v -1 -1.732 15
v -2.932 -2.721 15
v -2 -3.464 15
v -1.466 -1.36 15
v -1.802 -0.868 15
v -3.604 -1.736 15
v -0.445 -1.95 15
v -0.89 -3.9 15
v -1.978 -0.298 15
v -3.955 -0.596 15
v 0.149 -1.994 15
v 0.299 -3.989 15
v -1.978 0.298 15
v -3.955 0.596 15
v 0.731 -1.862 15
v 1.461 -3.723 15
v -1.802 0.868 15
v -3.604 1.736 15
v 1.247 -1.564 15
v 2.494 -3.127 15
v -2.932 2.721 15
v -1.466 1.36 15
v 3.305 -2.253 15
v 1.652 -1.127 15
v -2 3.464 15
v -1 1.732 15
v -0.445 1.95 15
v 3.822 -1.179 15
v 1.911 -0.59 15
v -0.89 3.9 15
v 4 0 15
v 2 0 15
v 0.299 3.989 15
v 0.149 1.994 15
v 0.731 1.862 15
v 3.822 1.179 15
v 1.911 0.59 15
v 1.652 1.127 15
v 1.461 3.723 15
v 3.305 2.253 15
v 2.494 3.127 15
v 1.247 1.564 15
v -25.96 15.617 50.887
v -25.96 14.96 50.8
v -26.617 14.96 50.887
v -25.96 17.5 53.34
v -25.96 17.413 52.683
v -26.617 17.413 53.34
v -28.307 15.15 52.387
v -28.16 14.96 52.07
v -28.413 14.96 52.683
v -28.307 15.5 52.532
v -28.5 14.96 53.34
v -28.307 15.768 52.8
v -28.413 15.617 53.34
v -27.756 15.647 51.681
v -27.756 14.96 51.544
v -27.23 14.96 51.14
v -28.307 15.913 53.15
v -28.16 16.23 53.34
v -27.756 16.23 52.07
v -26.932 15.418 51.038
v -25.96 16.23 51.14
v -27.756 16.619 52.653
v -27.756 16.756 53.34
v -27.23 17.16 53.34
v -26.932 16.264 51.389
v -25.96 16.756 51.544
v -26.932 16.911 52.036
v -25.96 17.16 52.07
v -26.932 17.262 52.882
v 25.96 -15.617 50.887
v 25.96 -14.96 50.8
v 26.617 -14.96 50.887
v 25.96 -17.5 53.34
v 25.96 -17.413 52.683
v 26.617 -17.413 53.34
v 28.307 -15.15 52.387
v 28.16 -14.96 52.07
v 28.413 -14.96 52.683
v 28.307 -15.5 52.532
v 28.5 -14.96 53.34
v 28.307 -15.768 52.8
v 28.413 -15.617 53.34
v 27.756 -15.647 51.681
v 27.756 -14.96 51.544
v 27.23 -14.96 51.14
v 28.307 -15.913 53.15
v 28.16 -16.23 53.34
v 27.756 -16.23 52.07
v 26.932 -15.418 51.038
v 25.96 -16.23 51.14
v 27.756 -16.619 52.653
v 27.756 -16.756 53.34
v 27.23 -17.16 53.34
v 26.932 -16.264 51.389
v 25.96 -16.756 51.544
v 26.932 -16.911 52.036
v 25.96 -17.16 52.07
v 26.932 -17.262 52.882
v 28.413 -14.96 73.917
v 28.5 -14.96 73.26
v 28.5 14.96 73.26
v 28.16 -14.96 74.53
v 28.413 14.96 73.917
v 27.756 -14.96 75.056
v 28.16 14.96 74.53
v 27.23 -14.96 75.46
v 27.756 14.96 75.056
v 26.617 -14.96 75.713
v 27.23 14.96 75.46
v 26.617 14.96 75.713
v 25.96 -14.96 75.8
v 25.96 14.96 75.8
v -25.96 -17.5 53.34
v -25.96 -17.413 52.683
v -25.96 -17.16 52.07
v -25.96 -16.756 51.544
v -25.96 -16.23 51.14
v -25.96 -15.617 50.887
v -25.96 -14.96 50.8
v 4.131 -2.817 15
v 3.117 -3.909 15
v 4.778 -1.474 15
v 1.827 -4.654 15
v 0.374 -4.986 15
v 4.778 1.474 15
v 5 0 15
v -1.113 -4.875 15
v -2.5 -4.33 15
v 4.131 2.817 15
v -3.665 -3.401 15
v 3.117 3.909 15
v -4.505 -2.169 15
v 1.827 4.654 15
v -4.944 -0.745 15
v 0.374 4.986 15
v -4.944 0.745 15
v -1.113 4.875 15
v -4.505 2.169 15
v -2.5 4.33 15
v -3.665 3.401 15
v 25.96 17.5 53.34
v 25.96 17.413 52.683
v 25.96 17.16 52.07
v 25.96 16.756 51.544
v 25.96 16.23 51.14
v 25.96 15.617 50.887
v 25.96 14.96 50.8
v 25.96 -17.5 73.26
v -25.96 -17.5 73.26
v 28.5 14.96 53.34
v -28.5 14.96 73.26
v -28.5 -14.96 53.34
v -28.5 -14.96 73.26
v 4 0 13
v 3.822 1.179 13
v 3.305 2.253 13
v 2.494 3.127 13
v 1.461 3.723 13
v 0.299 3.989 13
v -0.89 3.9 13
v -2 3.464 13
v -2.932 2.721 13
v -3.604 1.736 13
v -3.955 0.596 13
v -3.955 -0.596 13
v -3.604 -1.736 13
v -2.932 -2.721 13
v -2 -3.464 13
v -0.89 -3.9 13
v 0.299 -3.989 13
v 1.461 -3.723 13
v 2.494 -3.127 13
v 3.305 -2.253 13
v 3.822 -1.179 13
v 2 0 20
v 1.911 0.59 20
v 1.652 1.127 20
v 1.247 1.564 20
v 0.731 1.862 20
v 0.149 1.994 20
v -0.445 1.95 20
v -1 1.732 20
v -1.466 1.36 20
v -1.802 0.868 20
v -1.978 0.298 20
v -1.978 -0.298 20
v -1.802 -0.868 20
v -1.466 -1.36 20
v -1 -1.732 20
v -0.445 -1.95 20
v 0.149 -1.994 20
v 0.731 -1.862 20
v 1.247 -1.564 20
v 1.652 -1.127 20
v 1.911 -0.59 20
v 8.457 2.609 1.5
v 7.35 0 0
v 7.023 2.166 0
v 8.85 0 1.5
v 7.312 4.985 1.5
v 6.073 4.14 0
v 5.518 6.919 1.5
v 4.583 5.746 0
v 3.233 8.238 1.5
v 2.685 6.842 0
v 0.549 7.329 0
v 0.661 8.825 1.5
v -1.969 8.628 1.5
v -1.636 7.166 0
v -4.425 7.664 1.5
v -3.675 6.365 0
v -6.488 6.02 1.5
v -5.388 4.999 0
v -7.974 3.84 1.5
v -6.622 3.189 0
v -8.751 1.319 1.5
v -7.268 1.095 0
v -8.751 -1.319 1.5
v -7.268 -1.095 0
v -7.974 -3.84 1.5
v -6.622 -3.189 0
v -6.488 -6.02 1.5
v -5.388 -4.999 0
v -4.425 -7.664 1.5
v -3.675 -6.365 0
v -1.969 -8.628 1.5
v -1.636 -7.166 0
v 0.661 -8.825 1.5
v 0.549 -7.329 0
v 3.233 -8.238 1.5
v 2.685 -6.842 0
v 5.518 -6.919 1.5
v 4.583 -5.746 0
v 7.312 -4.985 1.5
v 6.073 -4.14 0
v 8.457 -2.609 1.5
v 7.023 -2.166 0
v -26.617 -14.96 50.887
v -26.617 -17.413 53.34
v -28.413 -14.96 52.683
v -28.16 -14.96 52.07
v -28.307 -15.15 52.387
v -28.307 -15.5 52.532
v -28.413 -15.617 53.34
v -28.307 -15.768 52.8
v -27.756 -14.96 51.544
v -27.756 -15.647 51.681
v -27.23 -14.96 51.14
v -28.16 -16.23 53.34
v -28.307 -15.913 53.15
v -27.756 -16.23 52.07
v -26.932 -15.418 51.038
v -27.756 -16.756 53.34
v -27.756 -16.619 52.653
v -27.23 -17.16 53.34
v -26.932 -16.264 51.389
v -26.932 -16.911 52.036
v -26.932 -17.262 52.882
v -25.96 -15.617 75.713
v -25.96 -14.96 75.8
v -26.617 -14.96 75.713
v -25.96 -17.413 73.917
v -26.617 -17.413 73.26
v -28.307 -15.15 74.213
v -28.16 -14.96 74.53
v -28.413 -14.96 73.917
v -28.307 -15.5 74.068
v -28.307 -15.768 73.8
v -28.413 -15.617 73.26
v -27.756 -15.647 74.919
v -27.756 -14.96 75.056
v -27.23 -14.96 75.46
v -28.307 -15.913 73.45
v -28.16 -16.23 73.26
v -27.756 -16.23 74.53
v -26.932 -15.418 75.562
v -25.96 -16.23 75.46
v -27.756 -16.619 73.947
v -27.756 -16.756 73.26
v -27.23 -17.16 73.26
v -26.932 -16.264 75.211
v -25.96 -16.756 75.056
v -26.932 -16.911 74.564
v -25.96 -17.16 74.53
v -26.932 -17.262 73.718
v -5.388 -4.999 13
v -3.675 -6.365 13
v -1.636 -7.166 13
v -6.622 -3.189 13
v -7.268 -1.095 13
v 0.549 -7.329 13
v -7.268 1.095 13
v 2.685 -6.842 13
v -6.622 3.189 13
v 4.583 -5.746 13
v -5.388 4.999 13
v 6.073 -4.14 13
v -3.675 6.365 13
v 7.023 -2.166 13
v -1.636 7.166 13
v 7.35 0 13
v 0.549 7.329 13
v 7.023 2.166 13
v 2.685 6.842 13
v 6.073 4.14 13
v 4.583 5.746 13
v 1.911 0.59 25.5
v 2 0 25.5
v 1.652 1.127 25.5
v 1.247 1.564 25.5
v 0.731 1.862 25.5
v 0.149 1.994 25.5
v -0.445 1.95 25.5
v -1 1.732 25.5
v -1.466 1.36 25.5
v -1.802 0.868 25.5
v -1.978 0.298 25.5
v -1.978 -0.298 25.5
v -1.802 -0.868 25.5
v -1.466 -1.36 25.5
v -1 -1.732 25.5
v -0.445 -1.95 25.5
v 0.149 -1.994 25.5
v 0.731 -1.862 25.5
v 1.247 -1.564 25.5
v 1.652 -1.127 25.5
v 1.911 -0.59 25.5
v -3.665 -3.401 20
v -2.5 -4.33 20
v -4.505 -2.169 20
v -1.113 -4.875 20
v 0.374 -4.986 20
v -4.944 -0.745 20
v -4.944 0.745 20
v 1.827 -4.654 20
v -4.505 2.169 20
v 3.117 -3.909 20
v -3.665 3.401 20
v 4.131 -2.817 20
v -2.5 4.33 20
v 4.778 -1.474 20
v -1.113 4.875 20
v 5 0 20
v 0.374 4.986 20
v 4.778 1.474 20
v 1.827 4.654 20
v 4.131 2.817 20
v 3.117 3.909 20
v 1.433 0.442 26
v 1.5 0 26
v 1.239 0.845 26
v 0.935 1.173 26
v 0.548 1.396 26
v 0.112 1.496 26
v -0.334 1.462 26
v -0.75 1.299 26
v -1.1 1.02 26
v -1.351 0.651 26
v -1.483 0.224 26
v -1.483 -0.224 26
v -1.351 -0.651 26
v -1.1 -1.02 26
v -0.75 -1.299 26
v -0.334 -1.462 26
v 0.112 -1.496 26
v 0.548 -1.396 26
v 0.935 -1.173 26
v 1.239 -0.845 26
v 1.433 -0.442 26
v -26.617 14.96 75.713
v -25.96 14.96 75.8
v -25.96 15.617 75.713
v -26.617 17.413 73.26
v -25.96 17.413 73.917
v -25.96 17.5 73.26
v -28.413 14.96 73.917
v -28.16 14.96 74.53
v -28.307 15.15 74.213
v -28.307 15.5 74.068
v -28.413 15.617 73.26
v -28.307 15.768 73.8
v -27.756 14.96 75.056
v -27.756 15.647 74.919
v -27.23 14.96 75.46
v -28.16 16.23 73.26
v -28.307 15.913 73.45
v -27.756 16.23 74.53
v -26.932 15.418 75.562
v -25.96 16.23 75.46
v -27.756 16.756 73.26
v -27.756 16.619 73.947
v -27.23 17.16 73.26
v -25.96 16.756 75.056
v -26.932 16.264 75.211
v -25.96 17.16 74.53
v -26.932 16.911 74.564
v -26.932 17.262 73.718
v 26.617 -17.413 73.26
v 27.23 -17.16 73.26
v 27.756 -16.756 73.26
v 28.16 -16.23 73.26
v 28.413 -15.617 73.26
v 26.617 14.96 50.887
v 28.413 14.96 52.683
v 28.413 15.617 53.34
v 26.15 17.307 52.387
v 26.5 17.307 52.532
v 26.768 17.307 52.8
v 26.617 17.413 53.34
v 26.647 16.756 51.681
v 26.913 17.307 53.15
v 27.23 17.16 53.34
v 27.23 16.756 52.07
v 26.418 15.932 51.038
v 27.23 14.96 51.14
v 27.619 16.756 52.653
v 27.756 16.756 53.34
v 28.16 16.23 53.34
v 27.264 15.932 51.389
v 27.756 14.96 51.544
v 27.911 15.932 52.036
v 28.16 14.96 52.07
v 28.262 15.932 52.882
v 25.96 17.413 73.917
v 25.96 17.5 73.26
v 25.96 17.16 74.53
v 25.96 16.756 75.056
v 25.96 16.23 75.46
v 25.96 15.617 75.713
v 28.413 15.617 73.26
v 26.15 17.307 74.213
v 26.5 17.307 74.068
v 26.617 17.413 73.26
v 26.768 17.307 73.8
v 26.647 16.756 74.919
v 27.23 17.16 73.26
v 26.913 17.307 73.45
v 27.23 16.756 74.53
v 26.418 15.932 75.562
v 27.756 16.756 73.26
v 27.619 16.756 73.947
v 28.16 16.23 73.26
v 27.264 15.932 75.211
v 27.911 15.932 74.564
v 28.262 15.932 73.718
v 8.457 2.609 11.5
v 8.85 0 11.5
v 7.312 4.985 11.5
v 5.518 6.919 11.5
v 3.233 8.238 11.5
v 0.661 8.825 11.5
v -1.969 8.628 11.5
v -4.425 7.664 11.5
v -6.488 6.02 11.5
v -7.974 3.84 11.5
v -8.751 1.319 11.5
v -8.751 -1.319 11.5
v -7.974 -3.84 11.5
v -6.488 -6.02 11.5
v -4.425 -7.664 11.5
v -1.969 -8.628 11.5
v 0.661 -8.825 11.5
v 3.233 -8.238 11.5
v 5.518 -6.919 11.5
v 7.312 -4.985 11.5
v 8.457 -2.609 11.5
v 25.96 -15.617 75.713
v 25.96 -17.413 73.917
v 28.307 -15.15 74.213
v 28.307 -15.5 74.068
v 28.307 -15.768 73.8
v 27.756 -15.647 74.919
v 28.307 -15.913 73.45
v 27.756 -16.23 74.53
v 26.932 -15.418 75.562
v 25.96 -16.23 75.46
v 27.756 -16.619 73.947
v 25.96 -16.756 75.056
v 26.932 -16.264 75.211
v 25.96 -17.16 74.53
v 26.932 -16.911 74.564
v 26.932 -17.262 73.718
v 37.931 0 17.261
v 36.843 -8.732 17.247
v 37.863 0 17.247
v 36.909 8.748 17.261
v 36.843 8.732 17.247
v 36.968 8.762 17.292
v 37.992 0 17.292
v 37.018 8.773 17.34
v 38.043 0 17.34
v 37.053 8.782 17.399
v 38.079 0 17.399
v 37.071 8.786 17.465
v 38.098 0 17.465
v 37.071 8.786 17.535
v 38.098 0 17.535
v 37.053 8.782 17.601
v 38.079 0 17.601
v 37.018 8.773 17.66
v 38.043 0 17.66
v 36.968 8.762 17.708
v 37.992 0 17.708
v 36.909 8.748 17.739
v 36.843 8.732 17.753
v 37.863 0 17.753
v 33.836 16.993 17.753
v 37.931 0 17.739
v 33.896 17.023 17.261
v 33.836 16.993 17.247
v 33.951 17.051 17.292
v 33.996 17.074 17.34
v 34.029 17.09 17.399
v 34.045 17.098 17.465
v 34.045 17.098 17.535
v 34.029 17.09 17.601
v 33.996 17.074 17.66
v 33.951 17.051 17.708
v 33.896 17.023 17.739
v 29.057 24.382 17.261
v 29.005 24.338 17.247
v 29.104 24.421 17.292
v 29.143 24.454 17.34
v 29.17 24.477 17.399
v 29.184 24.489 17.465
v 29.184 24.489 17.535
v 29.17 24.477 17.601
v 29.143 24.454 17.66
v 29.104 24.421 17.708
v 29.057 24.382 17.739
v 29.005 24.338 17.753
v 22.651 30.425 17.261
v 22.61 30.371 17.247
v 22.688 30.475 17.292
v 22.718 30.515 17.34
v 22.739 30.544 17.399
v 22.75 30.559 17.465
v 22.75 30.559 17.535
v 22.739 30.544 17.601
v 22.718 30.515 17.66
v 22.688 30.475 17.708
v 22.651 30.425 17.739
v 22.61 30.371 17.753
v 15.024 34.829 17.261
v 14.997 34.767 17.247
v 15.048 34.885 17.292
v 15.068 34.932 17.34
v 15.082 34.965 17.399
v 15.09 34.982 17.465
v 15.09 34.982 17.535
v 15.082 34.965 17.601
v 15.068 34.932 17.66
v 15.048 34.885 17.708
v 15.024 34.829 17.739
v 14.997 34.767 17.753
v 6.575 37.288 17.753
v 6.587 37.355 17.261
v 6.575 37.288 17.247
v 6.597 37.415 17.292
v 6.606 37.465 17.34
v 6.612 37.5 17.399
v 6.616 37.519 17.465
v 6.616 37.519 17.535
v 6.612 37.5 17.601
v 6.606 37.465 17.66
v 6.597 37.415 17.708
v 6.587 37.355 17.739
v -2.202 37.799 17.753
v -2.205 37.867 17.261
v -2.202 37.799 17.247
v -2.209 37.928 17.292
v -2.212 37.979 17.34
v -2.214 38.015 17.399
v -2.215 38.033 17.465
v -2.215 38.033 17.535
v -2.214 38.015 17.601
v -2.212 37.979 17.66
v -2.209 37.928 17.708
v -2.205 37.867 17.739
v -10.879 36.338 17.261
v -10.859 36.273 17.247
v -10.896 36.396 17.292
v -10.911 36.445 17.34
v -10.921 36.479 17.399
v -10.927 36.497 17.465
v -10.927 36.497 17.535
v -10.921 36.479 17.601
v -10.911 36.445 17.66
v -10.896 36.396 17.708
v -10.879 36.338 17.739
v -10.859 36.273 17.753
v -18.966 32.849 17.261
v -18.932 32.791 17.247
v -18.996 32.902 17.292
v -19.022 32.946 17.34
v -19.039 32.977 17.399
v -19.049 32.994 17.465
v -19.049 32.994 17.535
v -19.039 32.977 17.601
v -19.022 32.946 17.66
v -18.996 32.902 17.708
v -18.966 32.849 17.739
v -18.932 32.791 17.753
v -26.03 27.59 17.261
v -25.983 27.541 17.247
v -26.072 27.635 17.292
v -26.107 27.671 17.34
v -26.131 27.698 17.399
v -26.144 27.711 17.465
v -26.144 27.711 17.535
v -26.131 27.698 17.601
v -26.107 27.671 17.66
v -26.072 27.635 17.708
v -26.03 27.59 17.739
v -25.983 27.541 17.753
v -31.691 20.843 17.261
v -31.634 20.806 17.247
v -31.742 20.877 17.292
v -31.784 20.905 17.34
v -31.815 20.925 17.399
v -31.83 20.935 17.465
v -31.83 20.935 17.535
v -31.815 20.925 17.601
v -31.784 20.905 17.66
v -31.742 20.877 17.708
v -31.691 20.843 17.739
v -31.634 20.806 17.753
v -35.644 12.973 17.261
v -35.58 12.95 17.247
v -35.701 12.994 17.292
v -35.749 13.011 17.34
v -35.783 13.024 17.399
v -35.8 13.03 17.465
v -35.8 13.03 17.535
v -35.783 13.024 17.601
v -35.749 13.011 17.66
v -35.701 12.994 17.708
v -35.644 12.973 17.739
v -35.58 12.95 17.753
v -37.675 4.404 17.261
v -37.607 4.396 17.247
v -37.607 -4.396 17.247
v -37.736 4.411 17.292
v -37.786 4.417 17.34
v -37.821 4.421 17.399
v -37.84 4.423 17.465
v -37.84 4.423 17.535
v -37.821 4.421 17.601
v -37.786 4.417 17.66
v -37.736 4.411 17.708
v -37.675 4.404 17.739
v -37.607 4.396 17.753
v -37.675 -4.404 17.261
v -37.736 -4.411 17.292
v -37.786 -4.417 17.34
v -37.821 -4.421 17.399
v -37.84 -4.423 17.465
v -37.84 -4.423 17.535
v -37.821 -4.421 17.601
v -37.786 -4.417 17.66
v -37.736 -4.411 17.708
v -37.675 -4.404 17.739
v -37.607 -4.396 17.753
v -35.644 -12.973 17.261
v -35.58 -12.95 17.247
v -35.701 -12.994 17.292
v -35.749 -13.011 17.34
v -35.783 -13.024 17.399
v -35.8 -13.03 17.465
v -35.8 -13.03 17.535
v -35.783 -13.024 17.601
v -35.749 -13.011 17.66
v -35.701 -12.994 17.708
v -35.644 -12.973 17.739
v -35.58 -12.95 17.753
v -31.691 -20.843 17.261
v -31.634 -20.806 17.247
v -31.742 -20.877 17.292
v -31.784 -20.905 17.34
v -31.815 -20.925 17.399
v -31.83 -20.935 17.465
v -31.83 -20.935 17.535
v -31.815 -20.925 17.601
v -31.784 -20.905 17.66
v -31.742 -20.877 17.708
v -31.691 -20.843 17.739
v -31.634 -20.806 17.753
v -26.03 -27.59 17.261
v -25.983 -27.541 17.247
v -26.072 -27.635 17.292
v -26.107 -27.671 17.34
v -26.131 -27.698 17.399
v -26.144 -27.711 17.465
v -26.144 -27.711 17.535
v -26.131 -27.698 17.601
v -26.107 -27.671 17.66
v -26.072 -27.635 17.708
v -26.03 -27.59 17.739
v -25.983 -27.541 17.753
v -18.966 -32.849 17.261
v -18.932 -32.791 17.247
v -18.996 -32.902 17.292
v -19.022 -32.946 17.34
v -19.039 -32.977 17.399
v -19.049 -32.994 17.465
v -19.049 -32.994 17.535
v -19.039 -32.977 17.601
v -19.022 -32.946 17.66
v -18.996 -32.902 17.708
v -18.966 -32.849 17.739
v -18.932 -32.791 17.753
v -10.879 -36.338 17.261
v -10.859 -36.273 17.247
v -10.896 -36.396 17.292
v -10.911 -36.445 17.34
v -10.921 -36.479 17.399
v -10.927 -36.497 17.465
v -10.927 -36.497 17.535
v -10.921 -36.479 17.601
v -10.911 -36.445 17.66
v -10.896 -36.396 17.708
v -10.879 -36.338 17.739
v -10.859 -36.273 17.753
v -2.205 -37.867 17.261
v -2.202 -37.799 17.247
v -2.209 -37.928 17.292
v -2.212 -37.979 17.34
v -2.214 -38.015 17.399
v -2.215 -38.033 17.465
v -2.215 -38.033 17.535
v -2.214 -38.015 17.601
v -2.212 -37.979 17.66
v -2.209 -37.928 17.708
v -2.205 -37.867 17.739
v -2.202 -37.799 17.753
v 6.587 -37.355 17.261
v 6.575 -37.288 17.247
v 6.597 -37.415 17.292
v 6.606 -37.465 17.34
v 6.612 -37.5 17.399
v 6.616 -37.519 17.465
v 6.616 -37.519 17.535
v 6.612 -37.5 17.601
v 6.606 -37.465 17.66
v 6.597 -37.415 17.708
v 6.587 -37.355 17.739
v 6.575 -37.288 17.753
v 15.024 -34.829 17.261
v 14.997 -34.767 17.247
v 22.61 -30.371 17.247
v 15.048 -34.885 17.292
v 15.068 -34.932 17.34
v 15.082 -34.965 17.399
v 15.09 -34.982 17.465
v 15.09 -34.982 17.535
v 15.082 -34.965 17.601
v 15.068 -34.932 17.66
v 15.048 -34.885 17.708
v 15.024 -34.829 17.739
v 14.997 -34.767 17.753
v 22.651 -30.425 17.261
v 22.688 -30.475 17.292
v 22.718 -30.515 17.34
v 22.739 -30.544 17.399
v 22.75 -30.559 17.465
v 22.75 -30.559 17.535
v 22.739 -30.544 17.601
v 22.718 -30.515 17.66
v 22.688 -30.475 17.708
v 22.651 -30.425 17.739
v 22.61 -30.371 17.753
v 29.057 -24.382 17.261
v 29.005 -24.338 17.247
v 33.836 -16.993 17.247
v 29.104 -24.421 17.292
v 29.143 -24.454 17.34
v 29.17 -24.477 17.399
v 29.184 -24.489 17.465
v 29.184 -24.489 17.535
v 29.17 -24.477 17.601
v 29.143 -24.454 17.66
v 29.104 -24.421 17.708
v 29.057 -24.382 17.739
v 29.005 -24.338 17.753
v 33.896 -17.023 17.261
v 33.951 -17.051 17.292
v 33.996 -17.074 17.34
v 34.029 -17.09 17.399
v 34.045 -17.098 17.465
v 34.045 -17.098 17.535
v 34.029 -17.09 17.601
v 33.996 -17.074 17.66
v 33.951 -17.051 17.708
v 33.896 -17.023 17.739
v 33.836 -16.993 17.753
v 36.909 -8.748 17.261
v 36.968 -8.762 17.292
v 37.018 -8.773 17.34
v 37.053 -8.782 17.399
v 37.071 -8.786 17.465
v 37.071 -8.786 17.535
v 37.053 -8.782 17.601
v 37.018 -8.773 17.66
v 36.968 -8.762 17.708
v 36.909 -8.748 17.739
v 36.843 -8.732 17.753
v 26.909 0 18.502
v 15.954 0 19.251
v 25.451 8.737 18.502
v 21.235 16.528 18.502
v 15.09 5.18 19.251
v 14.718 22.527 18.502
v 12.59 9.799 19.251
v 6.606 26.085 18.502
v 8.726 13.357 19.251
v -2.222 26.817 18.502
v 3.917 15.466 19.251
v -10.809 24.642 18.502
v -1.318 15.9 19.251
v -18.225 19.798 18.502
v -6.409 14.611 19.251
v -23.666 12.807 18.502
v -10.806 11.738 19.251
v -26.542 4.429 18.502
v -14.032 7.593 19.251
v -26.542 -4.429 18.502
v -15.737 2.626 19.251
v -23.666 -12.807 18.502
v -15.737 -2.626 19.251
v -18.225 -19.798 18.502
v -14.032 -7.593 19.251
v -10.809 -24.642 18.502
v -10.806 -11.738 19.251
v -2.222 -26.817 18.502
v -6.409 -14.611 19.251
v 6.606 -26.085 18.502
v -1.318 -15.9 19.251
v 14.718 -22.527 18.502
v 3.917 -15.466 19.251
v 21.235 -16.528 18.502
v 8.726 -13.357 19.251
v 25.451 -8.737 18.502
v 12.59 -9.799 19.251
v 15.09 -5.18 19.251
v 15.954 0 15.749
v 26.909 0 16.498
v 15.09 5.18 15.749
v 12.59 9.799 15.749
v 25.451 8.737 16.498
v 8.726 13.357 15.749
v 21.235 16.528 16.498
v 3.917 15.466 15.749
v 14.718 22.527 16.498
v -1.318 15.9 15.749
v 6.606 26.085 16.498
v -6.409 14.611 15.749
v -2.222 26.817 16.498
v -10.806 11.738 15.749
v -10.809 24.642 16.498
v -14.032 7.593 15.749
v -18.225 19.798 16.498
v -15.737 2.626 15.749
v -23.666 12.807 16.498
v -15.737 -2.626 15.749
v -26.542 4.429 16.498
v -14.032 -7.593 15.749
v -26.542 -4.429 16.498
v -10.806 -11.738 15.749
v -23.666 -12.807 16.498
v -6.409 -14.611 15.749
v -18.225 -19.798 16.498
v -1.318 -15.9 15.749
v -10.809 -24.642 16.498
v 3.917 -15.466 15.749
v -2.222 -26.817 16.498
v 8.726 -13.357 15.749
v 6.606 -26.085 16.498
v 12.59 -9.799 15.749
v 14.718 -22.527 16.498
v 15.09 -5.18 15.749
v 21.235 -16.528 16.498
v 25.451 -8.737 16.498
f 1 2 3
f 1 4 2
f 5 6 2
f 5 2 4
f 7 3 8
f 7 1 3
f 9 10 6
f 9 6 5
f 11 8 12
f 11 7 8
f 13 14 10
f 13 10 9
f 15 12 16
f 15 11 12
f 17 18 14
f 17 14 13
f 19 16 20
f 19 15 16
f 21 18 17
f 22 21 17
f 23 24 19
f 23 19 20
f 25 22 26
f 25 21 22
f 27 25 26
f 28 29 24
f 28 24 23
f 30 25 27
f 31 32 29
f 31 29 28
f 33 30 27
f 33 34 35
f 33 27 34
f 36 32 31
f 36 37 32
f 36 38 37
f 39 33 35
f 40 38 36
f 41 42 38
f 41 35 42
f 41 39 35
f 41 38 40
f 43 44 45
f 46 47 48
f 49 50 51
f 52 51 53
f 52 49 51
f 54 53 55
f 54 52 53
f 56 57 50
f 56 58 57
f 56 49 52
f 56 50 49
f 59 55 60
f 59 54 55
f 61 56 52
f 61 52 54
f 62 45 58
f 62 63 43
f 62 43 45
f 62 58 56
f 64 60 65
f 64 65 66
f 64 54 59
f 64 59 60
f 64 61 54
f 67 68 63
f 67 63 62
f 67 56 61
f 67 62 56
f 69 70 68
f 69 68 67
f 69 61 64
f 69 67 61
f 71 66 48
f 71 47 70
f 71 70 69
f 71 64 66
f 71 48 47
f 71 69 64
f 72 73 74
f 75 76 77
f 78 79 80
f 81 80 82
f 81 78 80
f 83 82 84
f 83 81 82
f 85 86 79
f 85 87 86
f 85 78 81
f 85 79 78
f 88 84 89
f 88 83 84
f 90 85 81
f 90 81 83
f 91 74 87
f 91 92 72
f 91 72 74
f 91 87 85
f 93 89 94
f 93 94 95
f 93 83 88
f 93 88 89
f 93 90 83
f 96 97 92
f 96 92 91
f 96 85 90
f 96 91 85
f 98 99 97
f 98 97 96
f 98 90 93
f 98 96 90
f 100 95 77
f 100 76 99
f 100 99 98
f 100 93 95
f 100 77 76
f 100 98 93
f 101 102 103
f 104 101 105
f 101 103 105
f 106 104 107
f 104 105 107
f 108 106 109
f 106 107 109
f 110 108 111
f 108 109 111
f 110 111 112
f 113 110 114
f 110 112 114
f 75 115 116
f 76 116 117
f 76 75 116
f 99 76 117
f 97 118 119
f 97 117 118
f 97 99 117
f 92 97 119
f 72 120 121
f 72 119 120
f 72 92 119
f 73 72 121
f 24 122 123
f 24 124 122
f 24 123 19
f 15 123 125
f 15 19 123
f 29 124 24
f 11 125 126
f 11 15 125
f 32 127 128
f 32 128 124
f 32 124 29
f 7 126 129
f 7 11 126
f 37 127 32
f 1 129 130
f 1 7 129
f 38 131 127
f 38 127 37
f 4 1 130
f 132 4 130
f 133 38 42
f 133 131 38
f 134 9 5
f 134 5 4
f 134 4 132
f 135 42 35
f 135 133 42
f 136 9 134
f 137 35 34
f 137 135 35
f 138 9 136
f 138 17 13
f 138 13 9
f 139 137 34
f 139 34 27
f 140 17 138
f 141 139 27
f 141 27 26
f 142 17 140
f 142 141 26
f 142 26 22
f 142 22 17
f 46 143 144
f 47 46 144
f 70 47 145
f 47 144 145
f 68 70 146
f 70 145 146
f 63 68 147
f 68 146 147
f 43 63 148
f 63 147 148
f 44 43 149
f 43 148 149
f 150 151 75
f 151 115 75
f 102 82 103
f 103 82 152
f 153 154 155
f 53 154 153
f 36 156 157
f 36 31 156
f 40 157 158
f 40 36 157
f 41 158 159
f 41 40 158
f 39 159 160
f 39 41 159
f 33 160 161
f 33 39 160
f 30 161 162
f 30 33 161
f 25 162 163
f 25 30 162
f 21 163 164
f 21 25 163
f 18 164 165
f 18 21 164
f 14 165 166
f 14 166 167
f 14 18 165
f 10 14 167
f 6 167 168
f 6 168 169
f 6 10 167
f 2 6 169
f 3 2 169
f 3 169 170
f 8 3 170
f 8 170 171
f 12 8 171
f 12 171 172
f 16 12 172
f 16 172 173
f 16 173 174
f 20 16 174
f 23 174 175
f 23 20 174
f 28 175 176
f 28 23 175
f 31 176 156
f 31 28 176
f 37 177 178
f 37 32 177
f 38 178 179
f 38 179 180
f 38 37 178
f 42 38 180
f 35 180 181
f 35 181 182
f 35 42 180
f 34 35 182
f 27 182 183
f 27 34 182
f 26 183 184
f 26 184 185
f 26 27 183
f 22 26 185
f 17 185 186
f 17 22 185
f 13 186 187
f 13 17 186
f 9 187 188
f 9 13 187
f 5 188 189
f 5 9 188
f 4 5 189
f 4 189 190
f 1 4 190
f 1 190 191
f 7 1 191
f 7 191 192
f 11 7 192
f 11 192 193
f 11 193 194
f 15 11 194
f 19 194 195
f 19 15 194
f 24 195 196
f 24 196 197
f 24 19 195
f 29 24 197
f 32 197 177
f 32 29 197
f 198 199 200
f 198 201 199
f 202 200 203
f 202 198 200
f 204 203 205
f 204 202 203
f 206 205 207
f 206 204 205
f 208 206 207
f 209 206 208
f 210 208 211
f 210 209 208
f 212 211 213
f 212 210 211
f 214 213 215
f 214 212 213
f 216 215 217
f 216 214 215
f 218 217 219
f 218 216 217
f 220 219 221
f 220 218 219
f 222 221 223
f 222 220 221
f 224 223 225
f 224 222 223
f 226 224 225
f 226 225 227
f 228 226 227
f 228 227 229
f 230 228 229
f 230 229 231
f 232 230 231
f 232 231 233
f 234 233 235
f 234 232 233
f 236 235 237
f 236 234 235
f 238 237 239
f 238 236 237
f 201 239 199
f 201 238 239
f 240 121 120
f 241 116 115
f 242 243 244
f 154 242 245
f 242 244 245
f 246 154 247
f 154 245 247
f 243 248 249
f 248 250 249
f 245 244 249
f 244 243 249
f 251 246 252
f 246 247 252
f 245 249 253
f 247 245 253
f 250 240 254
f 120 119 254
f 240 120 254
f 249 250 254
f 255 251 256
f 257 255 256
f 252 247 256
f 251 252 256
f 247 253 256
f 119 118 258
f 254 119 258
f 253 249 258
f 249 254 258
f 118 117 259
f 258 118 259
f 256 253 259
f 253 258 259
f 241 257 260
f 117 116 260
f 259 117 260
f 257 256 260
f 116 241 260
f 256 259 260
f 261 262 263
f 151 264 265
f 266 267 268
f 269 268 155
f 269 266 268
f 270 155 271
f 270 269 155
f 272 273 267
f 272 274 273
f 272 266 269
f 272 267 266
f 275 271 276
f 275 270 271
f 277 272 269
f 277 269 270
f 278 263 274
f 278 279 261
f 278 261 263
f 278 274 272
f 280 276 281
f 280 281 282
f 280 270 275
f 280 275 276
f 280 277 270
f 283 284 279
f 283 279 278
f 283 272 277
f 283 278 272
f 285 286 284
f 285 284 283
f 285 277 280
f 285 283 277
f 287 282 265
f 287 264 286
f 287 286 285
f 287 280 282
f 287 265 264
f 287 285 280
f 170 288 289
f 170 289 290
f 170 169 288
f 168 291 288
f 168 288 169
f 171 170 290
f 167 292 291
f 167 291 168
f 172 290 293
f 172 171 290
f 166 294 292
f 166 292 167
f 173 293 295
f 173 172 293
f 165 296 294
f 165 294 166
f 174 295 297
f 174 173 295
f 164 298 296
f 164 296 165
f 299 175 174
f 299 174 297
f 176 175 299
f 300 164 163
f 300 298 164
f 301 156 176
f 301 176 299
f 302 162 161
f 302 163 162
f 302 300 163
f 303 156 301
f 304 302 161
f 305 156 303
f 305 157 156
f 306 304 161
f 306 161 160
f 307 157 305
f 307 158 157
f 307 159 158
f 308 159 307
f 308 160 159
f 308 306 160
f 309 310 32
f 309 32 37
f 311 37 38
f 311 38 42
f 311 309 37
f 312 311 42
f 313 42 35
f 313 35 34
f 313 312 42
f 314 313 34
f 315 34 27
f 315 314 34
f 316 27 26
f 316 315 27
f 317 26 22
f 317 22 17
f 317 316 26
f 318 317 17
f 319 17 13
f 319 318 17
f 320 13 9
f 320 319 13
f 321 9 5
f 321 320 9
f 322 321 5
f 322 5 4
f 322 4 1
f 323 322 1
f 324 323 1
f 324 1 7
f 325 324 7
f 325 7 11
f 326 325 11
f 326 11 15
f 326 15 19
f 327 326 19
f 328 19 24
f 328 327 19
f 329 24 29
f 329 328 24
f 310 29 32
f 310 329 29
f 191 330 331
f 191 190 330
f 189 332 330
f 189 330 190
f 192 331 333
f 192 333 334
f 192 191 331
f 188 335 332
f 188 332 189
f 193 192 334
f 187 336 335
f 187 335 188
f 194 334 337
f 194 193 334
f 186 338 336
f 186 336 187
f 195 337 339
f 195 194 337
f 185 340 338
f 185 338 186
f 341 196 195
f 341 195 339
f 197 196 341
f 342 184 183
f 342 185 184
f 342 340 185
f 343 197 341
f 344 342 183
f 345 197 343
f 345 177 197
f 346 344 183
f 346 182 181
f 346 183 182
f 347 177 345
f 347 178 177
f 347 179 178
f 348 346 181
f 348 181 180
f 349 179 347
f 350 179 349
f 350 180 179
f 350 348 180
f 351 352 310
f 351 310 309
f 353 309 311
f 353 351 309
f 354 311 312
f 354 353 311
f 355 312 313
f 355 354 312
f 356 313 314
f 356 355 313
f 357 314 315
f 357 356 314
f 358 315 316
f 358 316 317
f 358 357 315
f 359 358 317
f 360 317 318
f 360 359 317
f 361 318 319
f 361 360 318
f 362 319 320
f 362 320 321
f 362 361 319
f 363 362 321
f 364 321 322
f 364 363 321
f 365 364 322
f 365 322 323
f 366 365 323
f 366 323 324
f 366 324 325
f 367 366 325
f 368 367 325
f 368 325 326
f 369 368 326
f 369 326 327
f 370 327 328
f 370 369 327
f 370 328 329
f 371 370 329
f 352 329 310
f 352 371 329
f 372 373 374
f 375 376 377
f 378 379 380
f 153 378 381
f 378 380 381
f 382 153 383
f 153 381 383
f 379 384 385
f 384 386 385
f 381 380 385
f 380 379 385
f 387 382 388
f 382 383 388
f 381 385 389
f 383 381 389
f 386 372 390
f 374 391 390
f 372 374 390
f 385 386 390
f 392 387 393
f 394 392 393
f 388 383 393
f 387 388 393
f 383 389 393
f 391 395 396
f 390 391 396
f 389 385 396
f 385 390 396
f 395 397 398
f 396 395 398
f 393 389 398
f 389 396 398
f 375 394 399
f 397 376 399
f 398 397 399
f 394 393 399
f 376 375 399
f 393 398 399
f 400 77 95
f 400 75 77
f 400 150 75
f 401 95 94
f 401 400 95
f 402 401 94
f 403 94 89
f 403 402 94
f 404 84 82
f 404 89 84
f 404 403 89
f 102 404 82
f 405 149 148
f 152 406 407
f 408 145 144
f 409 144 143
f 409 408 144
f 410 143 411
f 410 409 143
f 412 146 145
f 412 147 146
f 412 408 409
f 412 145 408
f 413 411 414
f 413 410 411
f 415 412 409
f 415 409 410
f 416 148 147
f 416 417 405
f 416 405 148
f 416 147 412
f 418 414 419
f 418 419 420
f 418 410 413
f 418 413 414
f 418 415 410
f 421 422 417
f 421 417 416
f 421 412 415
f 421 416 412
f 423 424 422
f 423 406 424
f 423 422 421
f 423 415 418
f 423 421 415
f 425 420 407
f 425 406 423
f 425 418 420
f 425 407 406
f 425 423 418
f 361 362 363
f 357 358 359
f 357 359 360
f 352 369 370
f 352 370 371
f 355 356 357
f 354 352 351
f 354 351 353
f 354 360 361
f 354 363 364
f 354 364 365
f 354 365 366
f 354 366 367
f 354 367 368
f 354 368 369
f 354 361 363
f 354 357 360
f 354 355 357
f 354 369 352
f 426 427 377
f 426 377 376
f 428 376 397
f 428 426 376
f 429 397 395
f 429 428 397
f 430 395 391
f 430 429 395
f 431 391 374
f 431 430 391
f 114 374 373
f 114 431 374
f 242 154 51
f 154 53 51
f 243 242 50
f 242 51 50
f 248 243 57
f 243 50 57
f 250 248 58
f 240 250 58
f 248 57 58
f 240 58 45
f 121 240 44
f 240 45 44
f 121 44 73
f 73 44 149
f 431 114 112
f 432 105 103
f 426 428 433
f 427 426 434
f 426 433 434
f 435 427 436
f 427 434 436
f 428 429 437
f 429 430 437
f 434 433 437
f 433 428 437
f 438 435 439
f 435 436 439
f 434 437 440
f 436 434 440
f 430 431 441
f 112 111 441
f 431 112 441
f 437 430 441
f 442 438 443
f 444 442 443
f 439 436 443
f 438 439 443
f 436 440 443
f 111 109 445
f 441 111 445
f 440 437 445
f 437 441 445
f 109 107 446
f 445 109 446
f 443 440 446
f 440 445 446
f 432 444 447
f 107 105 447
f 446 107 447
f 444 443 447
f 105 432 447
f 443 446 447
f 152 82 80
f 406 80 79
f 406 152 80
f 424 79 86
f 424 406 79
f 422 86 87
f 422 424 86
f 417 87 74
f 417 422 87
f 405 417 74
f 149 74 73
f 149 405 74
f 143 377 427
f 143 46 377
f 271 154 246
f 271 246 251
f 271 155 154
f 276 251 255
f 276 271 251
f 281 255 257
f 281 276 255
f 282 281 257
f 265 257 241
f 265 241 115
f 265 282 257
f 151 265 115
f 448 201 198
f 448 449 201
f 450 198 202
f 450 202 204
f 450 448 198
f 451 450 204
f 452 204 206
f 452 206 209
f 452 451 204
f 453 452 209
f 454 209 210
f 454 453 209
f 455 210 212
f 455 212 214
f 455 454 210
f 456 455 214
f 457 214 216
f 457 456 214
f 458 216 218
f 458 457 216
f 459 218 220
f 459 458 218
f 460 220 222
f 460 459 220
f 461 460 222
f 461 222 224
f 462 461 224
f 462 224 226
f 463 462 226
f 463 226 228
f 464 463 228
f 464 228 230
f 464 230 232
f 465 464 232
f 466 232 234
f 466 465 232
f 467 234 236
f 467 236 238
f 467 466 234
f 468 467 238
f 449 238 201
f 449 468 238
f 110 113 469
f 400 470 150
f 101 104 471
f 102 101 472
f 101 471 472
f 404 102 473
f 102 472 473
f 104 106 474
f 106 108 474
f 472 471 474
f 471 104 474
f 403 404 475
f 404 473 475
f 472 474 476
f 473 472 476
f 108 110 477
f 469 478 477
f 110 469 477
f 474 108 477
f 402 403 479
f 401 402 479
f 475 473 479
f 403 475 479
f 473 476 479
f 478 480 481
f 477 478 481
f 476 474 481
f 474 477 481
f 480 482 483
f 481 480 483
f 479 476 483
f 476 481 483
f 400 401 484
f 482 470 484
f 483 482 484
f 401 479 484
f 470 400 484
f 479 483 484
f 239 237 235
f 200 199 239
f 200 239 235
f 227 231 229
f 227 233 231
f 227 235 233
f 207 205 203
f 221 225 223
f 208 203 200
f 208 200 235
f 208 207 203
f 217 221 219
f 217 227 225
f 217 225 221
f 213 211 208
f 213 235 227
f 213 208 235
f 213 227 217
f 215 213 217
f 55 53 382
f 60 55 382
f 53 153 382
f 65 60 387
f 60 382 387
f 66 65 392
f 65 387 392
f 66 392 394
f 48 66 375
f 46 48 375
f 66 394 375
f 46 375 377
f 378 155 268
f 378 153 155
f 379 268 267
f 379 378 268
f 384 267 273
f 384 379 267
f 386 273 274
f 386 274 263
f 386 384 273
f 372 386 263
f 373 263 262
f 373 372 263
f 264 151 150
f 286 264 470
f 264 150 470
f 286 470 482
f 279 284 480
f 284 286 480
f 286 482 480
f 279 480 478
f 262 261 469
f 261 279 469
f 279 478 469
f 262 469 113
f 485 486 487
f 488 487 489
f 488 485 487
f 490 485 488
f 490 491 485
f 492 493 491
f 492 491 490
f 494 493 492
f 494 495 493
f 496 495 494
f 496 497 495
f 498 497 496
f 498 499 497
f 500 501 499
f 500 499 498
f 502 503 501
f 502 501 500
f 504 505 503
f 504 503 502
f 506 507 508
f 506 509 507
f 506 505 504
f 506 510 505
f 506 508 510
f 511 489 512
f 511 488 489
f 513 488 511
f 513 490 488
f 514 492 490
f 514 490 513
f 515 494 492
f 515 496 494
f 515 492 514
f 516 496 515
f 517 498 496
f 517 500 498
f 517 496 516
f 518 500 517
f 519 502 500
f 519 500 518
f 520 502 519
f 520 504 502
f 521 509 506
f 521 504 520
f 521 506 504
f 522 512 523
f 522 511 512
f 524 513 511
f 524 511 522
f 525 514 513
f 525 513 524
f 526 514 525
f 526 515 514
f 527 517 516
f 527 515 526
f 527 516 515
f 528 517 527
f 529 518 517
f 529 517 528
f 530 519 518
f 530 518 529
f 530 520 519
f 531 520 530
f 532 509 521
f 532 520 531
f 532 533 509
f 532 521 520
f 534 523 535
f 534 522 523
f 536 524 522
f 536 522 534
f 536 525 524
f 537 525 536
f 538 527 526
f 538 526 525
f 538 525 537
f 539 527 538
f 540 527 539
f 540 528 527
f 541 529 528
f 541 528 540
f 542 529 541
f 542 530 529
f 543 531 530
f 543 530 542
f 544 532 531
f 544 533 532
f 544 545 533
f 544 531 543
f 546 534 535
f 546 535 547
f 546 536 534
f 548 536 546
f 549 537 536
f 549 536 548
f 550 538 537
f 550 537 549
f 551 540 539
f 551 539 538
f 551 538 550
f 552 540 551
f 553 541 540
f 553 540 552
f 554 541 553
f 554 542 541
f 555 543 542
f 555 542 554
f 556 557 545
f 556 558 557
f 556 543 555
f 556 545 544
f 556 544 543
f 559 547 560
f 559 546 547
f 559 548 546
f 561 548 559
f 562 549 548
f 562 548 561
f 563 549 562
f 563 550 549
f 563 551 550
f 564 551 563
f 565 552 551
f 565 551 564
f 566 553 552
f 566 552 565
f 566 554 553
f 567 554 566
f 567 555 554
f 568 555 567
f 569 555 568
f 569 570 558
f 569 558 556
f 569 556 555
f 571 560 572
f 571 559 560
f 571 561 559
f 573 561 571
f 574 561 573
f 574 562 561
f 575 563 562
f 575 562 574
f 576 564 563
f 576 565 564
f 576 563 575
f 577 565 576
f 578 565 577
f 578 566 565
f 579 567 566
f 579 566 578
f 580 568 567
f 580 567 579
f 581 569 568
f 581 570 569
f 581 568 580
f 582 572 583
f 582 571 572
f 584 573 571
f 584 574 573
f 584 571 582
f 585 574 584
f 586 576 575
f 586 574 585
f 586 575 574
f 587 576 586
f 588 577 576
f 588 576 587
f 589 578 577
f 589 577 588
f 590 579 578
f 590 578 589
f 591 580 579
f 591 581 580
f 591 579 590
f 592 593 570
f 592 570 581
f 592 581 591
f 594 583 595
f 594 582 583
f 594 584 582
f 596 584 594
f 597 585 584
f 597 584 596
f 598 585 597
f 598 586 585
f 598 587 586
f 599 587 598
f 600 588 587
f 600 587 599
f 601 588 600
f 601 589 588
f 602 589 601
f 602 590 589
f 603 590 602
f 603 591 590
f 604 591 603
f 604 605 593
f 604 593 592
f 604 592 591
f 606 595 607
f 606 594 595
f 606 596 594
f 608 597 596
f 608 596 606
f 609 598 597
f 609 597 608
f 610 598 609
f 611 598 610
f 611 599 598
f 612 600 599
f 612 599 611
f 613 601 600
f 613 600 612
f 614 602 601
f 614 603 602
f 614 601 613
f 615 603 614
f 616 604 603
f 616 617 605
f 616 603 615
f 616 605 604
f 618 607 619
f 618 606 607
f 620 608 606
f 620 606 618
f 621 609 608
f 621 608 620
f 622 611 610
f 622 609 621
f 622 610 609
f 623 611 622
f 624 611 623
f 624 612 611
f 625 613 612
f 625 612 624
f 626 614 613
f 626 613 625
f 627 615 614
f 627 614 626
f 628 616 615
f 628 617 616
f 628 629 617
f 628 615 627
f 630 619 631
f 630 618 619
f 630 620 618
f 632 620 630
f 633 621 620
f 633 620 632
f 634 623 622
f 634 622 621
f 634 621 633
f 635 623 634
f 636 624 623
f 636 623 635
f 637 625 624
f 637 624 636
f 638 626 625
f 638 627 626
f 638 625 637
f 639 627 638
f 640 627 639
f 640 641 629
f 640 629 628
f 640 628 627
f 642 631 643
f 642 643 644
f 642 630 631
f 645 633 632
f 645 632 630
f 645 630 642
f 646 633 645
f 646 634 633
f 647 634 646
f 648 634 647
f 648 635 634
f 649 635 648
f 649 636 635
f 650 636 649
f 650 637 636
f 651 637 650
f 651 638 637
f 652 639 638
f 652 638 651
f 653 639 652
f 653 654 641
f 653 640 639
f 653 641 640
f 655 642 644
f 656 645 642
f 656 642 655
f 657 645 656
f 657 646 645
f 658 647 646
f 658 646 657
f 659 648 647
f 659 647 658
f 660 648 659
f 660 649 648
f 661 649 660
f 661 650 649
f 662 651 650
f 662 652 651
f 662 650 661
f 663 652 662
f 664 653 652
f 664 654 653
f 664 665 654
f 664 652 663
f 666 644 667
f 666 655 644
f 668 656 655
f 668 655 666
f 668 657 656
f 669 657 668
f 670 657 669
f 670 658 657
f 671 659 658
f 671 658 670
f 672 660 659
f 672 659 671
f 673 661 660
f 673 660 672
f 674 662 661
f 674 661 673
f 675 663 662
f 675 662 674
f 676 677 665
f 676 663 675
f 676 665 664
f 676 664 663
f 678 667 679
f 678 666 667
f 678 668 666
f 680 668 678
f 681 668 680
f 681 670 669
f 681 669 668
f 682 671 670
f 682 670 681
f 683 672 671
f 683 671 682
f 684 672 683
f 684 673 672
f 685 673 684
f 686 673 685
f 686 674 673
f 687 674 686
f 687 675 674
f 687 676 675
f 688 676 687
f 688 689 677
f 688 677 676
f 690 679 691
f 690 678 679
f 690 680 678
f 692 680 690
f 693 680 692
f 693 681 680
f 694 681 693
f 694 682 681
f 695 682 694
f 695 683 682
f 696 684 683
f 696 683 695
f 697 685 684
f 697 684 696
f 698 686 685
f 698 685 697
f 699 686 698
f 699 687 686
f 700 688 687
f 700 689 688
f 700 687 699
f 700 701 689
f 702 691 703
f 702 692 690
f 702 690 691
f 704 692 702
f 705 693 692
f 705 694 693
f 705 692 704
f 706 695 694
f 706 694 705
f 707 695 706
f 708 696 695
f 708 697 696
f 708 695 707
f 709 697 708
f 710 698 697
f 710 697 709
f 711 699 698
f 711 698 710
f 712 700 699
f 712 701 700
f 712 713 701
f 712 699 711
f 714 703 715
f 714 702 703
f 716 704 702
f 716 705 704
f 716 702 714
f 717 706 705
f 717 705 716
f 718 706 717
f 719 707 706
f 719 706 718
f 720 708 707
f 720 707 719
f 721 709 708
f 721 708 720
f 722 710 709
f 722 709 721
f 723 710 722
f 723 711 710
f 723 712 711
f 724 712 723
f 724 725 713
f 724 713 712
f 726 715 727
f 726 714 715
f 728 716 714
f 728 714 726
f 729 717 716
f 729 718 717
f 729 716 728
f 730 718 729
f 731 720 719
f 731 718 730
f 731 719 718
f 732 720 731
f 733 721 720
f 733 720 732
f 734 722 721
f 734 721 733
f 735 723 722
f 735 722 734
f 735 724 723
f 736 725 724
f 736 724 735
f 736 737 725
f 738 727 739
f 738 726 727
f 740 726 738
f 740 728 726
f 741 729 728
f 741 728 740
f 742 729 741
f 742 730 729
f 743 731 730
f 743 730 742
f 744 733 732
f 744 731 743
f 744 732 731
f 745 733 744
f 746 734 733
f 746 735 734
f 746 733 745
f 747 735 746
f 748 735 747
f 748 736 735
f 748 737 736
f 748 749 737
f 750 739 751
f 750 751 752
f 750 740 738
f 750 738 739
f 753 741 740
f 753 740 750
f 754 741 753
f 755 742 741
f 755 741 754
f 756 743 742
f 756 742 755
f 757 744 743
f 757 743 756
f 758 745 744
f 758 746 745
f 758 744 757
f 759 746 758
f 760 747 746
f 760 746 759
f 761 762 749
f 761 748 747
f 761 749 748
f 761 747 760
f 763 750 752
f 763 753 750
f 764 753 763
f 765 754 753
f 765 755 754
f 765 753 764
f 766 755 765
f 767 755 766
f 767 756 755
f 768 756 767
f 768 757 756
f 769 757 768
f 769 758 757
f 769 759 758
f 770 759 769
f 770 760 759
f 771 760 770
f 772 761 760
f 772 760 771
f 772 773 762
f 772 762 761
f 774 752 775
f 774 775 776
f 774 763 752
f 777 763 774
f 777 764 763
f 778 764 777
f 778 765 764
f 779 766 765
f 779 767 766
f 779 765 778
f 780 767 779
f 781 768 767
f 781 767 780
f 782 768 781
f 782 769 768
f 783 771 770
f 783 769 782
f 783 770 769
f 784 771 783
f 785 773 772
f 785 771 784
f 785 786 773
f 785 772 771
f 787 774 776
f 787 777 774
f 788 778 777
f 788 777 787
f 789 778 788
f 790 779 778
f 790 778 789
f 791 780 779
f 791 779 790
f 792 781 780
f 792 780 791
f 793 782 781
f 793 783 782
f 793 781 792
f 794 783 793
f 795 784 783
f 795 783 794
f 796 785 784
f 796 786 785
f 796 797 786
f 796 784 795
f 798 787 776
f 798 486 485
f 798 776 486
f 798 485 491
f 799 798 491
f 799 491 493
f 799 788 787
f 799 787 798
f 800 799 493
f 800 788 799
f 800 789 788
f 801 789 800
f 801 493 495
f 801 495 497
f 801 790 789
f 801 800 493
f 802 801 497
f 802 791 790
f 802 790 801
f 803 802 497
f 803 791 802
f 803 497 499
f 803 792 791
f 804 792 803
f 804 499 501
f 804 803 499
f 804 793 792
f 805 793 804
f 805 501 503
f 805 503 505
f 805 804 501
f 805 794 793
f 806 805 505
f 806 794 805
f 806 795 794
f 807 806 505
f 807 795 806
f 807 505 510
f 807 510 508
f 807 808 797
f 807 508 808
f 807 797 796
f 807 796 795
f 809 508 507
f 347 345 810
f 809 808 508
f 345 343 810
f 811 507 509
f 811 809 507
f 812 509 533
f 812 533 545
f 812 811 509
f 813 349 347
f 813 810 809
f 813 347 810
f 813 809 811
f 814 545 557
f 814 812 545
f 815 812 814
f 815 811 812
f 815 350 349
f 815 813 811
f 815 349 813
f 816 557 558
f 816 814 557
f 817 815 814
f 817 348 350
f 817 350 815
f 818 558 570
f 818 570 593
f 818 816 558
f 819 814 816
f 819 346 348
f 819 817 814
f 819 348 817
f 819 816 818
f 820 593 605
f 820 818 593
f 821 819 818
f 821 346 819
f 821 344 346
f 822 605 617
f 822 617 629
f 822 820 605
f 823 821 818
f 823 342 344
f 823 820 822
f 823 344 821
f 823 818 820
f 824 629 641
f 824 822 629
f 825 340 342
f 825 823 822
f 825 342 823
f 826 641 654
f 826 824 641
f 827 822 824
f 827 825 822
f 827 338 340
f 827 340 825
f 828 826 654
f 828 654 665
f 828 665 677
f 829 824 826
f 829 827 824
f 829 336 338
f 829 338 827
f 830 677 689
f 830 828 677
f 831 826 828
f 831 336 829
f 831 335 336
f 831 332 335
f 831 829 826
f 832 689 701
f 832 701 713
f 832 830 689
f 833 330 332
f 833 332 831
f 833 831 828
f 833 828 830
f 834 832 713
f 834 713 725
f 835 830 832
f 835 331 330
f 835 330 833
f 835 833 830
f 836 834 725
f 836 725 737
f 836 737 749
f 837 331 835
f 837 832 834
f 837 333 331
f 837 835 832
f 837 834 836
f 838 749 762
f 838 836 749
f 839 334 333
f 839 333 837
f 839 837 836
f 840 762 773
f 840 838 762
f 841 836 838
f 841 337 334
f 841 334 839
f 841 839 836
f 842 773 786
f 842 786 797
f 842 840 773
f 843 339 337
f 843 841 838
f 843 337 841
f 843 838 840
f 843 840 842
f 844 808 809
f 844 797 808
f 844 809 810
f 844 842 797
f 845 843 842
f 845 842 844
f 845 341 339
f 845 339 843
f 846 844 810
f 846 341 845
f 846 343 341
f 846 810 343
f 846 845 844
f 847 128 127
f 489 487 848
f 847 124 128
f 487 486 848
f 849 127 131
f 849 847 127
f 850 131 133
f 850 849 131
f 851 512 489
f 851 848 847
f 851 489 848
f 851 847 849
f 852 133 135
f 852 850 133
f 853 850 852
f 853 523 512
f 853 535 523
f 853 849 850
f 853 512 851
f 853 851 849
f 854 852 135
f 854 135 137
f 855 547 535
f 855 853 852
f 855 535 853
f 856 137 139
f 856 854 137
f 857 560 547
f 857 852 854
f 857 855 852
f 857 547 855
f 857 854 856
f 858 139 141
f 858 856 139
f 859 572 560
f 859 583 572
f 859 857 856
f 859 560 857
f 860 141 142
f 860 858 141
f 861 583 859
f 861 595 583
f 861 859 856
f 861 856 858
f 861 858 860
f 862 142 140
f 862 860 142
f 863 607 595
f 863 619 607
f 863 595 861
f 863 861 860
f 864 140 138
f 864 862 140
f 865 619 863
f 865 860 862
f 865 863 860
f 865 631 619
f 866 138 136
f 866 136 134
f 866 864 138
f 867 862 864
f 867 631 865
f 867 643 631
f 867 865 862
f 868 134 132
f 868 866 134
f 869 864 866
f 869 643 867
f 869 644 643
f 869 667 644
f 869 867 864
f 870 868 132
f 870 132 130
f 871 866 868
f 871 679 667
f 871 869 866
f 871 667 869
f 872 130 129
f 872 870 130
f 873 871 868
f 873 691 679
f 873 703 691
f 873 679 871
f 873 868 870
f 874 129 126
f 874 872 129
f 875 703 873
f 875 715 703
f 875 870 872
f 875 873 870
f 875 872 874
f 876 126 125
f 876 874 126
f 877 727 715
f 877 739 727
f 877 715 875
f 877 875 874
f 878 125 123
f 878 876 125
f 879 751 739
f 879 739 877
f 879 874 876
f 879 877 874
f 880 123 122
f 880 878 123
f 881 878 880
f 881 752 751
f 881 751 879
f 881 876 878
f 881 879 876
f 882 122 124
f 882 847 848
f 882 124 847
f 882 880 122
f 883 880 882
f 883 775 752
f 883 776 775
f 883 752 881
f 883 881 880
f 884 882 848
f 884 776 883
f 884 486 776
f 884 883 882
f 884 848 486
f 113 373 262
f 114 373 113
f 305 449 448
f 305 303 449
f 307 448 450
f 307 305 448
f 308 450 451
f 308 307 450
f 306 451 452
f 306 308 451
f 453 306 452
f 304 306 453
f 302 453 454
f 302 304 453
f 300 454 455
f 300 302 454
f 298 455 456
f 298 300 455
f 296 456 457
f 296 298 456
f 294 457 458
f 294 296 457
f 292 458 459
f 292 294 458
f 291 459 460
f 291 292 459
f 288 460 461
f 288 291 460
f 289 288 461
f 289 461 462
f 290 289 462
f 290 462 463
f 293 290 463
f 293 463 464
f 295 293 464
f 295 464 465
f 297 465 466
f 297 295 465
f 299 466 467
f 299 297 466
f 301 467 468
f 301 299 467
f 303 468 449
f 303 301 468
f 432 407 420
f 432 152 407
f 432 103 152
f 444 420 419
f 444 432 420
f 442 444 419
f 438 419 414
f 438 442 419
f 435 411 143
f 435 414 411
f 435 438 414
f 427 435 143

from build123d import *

# Parameters (mm, degrees)
F2_SIZE  = 0.5
F6_W     = 57
F6_H     = 35
F7_DEPTH = 25
F8_R     = 2.54


with BuildPart() as f1:
    # F0 (on Front) → F1 (revolve)
    with BuildSketch(Plane.XZ):
        Polygon((0, 26), (0, 0), (7.35, 0), (8.85, 1.5), (8.85, 11.5), (7.35, 13), (4, 13), (4, 15), (2, 15), (2, 26), align=None)
    revolve(axis=Axis((0, 0, 10.904766), (0, 0, 1)))

    # F2
    f2_edges = [f1.edges().sort_by_distance(p)[0] for p in [
        (-2, 0, 26),
    ]]
    chamfer(f2_edges, length=F2_SIZE)


with BuildPart() as f4:
    # F3 (on Front) → F4 (revolve)
    with BuildSketch(Plane.XZ):
        with BuildLine():
            Line((5, 20), (2, 20))
            Line((2, 20), (2, 15))
            Line((2, 15), (5, 15))
            Line((5, 15), (37.863323, 17.246591))
            ThreePointArc((37.863323, 17.246591), (38.1, 17.5), (37.863323, 17.753409))
            Line((37.863323, 17.753409), (5, 20))
        make_face()
    revolve(axis=Axis((0, 0, 16.523505), (0, 0, 1)))


with BuildPart() as f7:
    # F6 (on offset) → F7 (new body)
    with BuildSketch(Plane.XY.offset(50.8)):
        Rectangle(F6_W, F6_H)
    extrude(amount=F7_DEPTH)

    # F8
    f8_edges = [f7.edges().sort_by_distance(p)[0] for p in [
        (0, -17.5, 75.8),
        (28.5, 0, 75.8),
        (0, 17.5, 75.8),
        (-28.5, 0, 75.8),
        (0, -17.5, 50.8),
        (28.5, 0, 50.8),
        (0, 17.5, 50.8),
        (-28.5, 0, 50.8),
        (28.5, -17.5, 63.3),
        (-28.5, -17.5, 63.3),
        (-28.5, 17.5, 63.3),
        (28.5, 17.5, 63.3),
    ]]
    fillet(f8_edges, radius=F8_R)


solid = Compound([f1.part, f4.part, f7.part])
